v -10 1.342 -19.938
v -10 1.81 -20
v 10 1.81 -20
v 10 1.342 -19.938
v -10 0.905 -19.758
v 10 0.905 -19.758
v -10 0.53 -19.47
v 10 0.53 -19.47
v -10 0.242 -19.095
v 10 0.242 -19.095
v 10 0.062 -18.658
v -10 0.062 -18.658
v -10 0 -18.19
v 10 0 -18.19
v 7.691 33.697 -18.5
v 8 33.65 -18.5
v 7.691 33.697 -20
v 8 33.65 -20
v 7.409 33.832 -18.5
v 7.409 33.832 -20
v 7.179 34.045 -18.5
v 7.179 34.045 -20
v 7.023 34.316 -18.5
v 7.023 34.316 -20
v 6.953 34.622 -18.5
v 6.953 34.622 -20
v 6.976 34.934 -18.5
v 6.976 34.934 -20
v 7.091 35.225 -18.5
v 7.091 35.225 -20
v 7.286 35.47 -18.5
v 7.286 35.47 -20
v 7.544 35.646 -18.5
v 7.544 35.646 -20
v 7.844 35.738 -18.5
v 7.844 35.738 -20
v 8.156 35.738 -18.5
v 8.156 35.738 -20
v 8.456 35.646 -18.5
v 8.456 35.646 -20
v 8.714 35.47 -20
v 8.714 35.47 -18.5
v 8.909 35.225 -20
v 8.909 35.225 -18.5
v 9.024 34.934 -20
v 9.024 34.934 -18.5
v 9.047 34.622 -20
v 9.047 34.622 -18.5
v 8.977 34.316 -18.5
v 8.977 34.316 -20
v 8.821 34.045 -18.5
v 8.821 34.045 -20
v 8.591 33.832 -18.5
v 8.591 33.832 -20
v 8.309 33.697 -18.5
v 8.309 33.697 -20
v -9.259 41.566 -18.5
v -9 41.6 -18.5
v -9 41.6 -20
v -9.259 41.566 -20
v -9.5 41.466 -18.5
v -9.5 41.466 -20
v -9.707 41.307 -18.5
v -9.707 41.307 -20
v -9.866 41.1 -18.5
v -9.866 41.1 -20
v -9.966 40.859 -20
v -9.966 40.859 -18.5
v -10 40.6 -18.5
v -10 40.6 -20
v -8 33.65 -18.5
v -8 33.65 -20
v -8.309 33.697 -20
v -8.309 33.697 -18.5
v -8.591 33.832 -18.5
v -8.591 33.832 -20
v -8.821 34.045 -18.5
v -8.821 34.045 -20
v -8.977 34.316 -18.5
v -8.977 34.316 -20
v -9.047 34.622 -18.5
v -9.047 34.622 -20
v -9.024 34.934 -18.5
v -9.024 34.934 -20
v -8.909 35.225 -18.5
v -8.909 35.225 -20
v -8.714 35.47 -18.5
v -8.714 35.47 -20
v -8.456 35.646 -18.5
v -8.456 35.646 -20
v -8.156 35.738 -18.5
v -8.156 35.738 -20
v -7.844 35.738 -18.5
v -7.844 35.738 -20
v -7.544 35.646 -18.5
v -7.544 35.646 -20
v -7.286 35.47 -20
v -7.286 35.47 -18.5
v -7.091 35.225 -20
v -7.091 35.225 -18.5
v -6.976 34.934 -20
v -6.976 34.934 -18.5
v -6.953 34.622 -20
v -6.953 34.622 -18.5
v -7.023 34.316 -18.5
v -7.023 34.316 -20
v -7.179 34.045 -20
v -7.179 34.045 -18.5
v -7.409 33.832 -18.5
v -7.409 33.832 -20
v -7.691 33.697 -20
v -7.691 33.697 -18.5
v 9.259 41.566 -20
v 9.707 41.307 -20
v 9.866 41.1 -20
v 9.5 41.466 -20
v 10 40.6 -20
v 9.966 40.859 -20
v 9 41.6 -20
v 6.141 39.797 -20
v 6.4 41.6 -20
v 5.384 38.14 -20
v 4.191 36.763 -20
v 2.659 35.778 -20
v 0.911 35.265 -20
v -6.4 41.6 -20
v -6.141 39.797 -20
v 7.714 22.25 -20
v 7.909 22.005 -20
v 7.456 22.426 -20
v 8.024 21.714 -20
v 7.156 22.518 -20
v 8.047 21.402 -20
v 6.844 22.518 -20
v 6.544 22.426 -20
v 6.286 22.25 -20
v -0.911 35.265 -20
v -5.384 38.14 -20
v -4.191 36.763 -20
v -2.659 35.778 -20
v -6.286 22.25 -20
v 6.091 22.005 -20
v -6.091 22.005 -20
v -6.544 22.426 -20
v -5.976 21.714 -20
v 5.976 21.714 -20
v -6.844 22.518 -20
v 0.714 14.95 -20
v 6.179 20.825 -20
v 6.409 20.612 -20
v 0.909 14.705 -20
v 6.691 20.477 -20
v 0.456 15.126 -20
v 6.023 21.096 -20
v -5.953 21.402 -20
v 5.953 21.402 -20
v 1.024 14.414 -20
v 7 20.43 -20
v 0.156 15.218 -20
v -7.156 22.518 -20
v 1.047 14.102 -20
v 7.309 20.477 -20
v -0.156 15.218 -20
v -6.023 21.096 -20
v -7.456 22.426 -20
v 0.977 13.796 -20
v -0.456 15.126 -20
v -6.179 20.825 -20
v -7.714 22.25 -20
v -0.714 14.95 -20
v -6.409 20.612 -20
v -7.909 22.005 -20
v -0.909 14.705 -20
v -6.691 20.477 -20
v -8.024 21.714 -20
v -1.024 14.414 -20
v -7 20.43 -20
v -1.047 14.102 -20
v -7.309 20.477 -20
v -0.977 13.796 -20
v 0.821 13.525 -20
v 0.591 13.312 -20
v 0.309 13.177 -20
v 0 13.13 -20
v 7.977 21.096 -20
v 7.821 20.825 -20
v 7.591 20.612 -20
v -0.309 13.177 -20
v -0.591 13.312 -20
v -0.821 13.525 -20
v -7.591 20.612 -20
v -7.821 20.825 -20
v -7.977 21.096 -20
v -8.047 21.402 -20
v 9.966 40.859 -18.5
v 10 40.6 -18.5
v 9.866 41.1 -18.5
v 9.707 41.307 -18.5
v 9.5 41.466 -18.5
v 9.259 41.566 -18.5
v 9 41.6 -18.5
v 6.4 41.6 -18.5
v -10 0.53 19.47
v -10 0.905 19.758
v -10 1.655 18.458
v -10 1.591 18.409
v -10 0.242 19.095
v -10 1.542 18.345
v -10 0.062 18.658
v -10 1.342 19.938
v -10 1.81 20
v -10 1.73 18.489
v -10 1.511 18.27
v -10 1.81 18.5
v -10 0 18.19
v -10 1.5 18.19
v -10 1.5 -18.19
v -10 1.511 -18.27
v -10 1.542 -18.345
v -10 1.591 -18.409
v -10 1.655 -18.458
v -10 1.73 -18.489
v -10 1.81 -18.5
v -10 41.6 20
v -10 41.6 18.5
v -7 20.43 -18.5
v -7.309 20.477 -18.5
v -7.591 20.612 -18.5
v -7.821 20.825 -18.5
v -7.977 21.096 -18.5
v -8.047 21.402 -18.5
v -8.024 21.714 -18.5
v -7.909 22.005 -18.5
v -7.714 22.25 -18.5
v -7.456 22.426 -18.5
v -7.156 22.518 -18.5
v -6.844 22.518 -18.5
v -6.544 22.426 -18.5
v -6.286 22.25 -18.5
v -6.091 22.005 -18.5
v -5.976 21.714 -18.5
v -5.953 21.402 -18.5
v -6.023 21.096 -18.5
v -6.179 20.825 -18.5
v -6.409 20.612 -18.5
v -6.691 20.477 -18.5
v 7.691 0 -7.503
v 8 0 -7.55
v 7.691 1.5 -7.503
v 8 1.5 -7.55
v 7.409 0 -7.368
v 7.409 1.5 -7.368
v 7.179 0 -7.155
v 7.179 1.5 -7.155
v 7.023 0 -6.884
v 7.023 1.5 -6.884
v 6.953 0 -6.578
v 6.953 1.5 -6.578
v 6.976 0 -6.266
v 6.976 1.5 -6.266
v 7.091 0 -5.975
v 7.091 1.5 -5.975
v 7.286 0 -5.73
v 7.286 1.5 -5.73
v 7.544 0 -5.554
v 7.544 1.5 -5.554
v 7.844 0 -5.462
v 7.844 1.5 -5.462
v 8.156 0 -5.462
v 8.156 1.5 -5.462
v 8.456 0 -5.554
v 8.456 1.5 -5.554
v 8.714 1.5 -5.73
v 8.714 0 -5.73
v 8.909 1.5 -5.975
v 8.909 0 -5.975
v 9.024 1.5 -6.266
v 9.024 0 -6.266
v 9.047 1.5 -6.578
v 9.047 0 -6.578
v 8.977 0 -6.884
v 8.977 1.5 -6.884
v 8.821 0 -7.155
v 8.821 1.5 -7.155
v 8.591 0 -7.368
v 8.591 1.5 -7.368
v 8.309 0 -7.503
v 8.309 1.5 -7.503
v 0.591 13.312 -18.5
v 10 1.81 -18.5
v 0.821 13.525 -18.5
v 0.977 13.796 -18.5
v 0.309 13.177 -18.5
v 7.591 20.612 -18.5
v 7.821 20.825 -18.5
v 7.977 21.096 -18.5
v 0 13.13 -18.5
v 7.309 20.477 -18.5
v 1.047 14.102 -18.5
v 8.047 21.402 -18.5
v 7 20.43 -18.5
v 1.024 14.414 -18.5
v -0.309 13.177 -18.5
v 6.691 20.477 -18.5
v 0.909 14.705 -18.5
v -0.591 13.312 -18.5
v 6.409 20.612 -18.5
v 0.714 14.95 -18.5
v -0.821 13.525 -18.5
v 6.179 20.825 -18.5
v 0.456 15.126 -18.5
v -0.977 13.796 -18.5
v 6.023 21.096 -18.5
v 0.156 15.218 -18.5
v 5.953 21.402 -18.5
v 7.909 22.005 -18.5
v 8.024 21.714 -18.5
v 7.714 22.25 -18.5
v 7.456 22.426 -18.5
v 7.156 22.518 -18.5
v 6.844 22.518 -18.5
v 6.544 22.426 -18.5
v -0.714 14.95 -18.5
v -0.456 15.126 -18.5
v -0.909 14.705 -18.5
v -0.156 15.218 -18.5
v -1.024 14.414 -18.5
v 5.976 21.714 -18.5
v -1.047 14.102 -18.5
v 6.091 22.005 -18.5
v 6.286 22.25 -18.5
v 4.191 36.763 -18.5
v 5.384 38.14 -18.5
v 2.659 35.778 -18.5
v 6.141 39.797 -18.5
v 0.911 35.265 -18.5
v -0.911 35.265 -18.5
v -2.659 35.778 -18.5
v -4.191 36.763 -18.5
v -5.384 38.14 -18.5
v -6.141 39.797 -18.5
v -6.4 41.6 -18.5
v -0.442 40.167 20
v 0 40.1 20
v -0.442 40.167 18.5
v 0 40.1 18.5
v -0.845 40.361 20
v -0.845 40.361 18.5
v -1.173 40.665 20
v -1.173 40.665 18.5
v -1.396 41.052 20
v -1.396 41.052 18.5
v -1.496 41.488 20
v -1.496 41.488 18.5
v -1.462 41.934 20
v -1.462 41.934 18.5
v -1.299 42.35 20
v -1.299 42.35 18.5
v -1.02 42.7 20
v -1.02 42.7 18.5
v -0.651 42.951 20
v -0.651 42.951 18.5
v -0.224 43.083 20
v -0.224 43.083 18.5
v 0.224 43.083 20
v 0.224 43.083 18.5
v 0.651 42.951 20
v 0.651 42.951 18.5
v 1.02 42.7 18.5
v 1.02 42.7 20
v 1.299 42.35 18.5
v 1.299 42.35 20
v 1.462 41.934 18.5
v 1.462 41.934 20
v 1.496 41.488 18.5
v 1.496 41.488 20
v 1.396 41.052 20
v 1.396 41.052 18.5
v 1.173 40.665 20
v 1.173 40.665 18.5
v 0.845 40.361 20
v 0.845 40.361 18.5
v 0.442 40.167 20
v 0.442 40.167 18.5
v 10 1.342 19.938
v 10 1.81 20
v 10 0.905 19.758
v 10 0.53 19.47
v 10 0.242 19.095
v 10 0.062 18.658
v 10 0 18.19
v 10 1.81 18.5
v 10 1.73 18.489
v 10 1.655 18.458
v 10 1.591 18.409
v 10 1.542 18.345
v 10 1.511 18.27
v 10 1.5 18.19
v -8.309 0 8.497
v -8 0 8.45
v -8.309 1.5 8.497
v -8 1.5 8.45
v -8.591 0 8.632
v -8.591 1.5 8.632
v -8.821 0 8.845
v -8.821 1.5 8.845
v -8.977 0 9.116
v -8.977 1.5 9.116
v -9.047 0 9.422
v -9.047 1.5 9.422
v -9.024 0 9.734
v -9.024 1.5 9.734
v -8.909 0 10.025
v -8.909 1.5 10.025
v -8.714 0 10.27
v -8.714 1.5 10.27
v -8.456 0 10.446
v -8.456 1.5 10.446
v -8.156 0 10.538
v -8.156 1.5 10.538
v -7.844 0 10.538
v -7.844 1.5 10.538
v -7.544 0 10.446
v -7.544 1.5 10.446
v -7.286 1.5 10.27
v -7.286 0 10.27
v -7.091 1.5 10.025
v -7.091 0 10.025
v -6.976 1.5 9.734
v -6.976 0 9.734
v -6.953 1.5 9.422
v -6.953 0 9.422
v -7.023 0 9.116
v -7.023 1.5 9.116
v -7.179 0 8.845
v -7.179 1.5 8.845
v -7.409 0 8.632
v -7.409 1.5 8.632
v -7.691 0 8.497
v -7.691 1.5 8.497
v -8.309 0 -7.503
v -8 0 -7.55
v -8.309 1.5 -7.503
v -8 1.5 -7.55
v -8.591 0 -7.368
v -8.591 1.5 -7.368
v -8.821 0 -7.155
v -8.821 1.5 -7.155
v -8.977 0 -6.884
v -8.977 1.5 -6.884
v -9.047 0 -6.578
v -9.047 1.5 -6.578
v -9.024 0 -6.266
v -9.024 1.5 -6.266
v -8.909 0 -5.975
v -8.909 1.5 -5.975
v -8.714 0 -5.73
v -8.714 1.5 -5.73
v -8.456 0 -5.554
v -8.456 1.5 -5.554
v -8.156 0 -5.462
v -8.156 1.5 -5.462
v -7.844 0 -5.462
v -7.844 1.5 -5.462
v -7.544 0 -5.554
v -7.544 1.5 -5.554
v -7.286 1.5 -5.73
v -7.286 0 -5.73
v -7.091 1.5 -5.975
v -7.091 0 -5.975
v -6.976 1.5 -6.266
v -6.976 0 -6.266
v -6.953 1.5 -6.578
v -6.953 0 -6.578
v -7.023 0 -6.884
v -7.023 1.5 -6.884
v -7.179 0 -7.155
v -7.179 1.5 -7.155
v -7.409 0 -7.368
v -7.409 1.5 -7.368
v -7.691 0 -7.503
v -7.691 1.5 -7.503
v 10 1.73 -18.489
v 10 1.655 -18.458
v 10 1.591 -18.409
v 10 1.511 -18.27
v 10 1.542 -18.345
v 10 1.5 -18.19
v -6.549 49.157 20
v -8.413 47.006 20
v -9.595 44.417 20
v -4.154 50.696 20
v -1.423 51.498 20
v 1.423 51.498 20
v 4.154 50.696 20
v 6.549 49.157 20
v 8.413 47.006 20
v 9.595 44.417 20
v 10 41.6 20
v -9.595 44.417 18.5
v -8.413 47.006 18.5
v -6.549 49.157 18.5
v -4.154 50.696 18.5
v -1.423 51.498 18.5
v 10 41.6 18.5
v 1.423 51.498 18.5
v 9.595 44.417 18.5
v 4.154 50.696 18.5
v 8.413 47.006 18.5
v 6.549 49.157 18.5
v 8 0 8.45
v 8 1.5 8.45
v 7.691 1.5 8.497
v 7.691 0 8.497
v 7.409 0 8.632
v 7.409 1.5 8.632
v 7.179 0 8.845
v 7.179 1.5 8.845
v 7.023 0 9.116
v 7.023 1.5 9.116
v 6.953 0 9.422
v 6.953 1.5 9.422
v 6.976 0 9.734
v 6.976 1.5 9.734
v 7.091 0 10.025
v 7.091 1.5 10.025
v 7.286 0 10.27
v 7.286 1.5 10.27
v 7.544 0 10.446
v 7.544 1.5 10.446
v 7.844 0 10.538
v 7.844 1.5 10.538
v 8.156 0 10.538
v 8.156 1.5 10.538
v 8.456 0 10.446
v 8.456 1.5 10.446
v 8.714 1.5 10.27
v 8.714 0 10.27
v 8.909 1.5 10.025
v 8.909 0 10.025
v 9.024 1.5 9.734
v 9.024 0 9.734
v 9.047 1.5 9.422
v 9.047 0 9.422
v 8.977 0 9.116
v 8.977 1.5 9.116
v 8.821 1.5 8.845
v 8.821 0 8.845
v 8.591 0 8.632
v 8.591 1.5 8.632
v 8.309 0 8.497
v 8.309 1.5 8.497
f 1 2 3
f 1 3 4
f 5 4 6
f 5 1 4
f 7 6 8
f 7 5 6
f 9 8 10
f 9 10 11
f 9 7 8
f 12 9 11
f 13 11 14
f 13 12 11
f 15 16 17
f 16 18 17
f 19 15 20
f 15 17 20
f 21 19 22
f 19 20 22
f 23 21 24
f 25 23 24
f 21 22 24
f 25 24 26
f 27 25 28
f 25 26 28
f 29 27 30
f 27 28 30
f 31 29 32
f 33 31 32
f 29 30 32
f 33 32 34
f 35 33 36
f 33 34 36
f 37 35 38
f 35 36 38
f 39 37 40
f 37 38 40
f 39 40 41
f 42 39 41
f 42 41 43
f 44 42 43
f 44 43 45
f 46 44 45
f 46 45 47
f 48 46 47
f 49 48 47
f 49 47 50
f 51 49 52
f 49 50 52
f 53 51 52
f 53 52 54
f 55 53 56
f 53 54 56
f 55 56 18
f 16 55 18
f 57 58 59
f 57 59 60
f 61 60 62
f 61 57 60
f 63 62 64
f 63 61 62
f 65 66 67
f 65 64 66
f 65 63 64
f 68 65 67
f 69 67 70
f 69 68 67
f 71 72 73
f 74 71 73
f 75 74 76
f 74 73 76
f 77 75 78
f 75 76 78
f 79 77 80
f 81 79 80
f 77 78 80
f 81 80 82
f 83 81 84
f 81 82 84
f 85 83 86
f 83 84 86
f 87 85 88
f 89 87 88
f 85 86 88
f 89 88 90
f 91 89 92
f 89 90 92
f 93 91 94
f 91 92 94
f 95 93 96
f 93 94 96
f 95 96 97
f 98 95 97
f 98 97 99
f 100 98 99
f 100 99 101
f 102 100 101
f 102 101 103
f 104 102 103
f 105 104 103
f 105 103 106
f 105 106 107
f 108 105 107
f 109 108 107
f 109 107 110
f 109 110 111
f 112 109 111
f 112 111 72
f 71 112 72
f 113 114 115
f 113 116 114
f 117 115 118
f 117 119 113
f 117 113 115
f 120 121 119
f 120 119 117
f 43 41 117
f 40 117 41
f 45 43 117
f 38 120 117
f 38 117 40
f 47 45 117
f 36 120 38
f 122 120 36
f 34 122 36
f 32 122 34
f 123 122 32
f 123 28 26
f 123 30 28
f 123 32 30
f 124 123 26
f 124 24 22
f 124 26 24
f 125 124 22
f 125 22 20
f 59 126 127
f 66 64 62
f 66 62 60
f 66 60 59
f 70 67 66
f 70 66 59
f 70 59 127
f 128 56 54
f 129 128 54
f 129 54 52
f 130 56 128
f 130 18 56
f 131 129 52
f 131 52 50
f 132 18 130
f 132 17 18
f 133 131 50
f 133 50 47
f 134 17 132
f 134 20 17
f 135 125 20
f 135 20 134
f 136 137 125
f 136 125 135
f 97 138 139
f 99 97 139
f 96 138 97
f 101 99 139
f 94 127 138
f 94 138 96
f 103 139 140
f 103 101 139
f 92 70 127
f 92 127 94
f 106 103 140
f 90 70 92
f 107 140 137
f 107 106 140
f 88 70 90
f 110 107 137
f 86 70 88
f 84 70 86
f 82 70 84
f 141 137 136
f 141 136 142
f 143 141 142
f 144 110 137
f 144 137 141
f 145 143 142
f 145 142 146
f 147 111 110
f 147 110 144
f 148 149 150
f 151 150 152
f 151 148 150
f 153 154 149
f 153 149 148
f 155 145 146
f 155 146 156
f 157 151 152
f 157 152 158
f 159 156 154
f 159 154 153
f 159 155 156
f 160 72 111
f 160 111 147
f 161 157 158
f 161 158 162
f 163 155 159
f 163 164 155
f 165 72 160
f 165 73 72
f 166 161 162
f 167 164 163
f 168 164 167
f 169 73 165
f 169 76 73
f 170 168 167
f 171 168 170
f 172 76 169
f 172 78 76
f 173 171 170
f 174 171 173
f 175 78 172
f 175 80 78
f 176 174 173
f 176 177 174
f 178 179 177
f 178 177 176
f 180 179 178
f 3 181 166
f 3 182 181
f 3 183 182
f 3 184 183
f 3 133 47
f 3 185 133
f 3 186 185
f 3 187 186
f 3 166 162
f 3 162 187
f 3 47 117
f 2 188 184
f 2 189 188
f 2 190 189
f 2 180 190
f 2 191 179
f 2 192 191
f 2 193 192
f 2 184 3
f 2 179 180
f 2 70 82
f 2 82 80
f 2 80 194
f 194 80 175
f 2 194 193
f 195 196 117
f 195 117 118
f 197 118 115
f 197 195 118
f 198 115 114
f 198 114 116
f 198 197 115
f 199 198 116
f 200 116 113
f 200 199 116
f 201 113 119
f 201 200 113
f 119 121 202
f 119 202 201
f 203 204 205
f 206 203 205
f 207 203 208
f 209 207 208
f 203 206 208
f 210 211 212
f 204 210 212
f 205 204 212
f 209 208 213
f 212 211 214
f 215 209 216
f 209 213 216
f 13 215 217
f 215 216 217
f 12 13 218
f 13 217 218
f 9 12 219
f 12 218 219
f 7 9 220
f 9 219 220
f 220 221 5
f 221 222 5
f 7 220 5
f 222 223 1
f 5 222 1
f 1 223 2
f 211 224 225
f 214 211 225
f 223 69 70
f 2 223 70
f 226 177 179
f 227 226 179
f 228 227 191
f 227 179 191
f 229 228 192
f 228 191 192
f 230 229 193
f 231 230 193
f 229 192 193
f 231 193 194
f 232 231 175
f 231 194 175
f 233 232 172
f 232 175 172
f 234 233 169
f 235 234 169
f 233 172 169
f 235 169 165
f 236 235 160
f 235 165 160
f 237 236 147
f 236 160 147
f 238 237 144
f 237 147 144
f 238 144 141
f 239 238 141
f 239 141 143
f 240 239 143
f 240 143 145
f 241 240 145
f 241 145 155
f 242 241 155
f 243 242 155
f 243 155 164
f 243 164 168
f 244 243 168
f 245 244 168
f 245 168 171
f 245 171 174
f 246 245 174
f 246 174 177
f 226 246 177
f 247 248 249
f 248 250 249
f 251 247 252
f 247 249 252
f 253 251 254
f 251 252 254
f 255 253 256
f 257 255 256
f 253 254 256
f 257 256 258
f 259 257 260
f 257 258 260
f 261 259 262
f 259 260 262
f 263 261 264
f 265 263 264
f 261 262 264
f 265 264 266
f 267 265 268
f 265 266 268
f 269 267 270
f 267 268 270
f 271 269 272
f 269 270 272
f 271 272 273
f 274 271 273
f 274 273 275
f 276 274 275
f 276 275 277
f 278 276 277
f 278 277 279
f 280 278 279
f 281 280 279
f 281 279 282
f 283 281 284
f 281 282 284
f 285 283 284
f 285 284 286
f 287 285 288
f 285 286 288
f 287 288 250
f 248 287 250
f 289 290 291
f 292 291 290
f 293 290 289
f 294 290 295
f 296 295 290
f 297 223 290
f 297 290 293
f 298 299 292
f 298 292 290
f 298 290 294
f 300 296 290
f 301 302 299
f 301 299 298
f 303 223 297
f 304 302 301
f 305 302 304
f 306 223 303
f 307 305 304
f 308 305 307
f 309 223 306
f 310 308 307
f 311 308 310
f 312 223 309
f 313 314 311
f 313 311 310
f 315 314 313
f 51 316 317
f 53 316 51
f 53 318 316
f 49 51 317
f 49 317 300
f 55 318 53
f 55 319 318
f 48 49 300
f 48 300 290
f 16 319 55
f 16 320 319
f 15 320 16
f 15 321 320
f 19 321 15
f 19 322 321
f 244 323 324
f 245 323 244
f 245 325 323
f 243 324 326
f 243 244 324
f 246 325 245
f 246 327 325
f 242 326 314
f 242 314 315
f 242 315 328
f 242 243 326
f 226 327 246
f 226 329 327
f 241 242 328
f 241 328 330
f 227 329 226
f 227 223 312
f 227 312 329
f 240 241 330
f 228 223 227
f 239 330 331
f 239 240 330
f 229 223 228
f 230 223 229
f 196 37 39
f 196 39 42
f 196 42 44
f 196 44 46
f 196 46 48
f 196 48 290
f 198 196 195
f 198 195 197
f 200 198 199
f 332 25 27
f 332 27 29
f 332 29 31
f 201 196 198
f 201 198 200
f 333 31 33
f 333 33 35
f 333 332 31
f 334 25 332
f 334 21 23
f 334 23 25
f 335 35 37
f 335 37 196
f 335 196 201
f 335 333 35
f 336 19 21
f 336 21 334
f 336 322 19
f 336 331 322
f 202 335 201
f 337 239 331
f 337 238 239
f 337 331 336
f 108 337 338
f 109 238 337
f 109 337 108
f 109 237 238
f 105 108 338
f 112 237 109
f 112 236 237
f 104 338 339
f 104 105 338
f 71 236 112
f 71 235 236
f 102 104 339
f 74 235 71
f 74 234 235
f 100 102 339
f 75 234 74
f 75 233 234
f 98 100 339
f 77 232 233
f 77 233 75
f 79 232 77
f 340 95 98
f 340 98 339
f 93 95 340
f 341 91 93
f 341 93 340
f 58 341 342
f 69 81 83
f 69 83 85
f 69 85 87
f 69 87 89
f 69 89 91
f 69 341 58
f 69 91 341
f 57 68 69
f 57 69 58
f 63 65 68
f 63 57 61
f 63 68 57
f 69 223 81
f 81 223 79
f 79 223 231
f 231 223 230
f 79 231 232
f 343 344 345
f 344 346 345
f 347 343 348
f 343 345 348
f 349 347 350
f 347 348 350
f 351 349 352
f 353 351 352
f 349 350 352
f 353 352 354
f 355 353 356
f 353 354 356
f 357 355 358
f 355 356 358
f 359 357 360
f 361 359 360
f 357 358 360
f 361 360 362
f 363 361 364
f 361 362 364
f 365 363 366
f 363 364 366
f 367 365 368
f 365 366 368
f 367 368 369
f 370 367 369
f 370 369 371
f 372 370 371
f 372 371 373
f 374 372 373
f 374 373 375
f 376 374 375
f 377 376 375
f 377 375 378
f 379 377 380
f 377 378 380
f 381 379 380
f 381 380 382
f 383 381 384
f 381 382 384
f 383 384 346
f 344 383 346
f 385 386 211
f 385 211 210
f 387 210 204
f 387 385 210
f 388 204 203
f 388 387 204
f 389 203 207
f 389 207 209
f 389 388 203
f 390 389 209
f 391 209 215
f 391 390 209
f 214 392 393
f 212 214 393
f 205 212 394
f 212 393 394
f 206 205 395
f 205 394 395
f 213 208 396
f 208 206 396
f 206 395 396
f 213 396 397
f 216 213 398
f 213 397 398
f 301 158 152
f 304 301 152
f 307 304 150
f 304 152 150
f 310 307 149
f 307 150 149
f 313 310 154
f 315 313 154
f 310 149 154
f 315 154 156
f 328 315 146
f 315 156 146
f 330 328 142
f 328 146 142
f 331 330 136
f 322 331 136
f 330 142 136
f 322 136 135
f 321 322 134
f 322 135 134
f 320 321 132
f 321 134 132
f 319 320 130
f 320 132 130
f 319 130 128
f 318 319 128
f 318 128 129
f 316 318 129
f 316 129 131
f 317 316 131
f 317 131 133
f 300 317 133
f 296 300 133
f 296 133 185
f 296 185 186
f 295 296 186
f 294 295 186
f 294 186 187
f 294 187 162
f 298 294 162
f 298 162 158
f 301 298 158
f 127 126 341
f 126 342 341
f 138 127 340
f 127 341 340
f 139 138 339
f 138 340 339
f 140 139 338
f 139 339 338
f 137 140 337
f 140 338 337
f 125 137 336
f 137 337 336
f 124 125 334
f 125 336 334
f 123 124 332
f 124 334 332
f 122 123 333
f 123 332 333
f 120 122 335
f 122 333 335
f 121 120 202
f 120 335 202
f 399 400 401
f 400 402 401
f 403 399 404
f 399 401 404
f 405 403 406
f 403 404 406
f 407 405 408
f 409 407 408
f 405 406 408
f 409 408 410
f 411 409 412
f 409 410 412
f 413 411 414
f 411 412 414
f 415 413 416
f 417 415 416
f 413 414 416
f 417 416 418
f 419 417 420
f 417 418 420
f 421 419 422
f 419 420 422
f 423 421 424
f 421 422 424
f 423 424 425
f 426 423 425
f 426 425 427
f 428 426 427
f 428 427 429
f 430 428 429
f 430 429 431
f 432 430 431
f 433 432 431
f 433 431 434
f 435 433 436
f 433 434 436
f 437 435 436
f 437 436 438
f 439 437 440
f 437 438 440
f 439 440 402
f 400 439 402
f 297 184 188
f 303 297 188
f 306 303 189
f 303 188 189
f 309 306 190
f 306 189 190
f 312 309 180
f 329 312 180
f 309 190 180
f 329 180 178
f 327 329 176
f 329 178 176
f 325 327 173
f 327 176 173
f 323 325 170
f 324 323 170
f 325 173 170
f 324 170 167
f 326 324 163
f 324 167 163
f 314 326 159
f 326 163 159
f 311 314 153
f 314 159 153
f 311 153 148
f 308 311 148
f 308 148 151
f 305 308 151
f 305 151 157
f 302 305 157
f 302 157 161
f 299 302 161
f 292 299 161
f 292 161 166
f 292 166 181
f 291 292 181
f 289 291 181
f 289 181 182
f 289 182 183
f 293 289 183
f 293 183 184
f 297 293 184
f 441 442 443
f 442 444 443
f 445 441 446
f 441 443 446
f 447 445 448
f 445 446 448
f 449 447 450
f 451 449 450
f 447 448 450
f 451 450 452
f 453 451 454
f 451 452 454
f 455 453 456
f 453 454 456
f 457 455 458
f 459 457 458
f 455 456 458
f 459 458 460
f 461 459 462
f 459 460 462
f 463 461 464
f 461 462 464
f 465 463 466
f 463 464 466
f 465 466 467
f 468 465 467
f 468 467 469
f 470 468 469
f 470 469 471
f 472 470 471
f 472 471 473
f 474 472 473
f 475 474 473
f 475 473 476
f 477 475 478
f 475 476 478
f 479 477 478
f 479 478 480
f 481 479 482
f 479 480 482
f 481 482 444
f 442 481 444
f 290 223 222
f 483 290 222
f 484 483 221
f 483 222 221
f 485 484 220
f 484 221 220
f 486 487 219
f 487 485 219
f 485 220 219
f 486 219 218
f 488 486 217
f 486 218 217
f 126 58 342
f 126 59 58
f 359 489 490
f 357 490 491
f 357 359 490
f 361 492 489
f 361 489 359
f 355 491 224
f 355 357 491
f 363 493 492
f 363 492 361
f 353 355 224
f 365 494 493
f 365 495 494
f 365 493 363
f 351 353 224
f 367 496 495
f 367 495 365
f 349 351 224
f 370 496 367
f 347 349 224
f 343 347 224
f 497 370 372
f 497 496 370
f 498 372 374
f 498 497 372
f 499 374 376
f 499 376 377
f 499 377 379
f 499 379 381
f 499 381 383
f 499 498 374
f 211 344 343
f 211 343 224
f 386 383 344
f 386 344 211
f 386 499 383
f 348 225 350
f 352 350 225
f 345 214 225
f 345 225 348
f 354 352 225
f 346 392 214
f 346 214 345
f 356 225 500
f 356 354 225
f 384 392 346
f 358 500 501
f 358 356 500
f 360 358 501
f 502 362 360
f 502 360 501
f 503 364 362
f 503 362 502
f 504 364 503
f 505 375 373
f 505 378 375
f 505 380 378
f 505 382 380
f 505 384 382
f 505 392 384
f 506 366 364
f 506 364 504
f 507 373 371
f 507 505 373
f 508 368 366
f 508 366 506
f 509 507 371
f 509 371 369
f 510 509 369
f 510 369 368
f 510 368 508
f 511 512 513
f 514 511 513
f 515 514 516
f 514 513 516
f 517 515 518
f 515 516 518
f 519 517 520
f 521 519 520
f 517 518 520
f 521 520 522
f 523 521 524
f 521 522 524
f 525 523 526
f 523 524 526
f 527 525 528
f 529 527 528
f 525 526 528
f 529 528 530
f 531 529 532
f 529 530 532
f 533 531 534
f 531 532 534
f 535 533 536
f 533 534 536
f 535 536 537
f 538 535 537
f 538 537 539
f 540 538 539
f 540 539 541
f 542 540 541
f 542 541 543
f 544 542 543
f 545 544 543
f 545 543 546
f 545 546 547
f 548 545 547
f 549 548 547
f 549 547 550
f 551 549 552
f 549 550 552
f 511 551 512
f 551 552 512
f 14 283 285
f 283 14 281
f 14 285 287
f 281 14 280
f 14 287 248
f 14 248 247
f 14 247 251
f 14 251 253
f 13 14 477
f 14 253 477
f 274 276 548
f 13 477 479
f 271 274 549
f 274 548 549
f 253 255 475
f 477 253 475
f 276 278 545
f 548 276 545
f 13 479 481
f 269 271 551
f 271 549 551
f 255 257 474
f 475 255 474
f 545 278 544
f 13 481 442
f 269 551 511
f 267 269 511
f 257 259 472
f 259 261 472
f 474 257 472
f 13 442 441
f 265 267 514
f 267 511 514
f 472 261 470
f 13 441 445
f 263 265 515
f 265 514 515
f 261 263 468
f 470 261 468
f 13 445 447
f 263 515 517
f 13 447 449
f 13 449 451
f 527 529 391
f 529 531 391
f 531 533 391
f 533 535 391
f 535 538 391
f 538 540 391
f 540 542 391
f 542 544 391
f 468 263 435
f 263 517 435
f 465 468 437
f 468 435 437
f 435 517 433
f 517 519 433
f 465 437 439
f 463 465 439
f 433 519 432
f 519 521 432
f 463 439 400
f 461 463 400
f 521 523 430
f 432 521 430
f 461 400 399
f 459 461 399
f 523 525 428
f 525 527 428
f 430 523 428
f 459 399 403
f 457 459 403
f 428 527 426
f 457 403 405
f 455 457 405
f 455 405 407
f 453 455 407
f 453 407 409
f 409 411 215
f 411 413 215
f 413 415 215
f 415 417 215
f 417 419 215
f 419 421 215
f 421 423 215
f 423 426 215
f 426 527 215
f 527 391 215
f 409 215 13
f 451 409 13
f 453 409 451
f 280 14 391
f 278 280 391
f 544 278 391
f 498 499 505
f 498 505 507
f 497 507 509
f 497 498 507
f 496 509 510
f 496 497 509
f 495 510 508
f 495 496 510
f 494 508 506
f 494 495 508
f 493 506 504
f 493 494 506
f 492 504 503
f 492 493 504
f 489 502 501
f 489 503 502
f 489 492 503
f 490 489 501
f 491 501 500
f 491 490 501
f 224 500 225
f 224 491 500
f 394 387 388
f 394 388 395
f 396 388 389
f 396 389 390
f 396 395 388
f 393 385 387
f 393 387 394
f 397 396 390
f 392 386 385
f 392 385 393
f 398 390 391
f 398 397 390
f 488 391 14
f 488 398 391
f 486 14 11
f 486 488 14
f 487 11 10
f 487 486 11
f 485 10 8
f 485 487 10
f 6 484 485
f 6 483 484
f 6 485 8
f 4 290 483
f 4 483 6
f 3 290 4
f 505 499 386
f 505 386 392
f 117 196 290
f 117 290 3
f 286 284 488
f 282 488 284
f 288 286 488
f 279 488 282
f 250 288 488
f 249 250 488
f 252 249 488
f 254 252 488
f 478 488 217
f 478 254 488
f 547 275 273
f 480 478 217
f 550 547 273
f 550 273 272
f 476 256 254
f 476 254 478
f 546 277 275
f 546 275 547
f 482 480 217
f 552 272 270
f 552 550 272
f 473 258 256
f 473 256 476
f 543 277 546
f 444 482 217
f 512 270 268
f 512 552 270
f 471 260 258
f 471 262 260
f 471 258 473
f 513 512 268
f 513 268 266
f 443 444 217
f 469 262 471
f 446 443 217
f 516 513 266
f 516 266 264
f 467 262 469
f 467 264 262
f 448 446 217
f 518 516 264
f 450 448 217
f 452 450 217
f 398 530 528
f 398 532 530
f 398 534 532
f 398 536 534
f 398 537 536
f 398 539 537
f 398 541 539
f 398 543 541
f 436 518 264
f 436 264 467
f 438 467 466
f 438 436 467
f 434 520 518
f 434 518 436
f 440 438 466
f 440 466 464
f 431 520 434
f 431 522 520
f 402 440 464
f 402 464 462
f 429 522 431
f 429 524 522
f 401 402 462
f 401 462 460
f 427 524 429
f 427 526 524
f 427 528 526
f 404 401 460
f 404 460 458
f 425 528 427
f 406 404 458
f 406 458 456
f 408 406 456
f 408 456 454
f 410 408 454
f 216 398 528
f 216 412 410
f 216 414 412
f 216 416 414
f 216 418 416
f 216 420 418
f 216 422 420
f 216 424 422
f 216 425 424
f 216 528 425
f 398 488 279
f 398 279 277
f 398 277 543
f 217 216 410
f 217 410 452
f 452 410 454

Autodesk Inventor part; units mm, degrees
ref_plane "YZ Plane" through (0, 0, 0) normal (1, 0, 0) x (0, 1, 0)
ref_plane "XZ Plane" through (0, 0, 0) normal (0, 1, 0) x (-1, 0, 0)
ref_plane "XY Plane" through (0, 0, 0) normal (0, 0, 1) x (1, 0, 0)
sketch "Sketch1" plane through (0, 0, 0) normal (0, 1, 0) x (-1, 0, 0)
  line L0 (10, -18.5) -> (-10, -18.5)
  line L1 (-10, -18.5) -> (-10, 18.5)
  line L2 (-10, 18.5) -> (10, 18.5)
  line L3 (10, 18.5) -> (10, -18.5)
  point P0 (0, 0)
  dimension "d0" = 20
  dimension "d1" = 37
  dimension "d2" = 18.5
  dimension "d3" = 10
extrude "Plate1" add sketch "Sketch1" along normal blind 1.5
sketch "Sketch2" plane through (-10, 0, -20) normal (0, 0, 1) x (1, 0, 0)
  line L0 (20, 0) -> (0, 0)
  line L1 (0, 0) -> (0, 51.6)
  line L2 (0, 51.6) -> (20, 51.6)
  line L3 (20, 51.6) -> (20, 0)
edge flange "Flange1" height 51.6 angle 90 thickness 1.5 bend radius 0.31 thickness toward (0, 0, 1) relief tear relief width 1.5 relief depth 0.75 edges at (0, 1.5, -18.5) wall of the first edge with corners at (10, 0, -20) (-10, 0, -20) (-10, 51.6, -20) (10, 51.6, -20)
bend "Bend1"
corner "Corner1"
sketch "Sketch3" plane through (10, 0, 20) normal (0, 0, -1) x (-1, 0, 0)
  line L0 (20, 0) -> (0, 0)
  line L1 (0, 0) -> (0, 51.6)
  line L2 (0, 51.6) -> (20, 51.6)
  line L3 (20, 51.6) -> (20, 0)
edge flange "Flange2" height 51.6 angle 90 thickness 1.5 bend radius 0.31 thickness toward (0, 0, -1) relief tear relief width 1.5 relief depth 0.75 edges at (0, 1.5, 18.5) wall of the first edge with corners at (-10, 0, 20) (10, 0, 20) (10, 51.6, 20) (-10, 51.6, 20)
bend "Bend2"
corner "Corner2"
sketch "Sketch4" plane through (-10, 51.6, 20) normal (0, 0, 1) x (1, 0, 0)
  circle A0 centre (10, -10) radius 10
  line L0 (0, 0) -> (20, 0) projected
  line L1 (0, 0) -> (20, 0)
  line L2 (20, 0) -> (20, -10)
  line L3 (20, -10) -> (0, -10)
  line L4 (0, -10) -> (0, 0)
  line L5 (0, -49.79) -> (0, 0) projected
  point P0 (10, -51.6)
  point P1 (10, 0)
  dimension "d26" = 20
  dimension "d25" = 10
  dimension "d27" = 10
  dimension "d28" = 10
extrude "Extrusion1" cut sketch "Sketch4" against normal blind 10 contours L4 L0 A0 | A0 L0 L2
sketch "Sketch5" plane through (10, 51.6, -20) normal (0, 0, -1) x (-1, 0, 0)
  arc A0 (20, -10) -> (0, -10) centre (10, -10) ccw projected
  point P0 (10, -51.6)
hole "Hole1" at (0, 41.6, -20) direction (0, 0, 1) diameter 12.8 depth 1.5
sketch "Sketch6" plane through (10, 51.6, -20) normal (0, 0, -1) x (-1, 0, 0)
  line L0 (0, 0) -> (20, 0) projected
  circle A0 centre (10, -10) radius 6.4 projected
  line L1 (-4, 0) -> (24, 0)
  line L2 (24, 0) -> (24, -10)
  line L3 (24, -10) -> (-4, -10)
  line L4 (-4, -10) -> (-4, 0)
  line L5 (0, -49.79) -> (0, 0) projected
  line L6 (0, -49.79) -> (20, -49.79) projected
  point P0 (10, -51.6)
  dimension "d38" = 28
  dimension "d39" = 10
  dimension "d40" = 4
  dimension "d41" = 49.79
extrude "Extrusion2" cut sketch "Sketch6" against normal blind 10 contours L5 L3 L4 L1 | L0 L1 L2 L3 A0 L5 | A0 L3 picked at (9.2435, -8.0053)
sketch "Sketch7" plane through (-10, 1.81, -18.5) normal (0, 0, 1) x (1, 0, 0)
  circle A0 centre (10, 12.37) radius 0.7835 projected
  circle A1 centre (17, 19.67) radius 0.7835 projected
  line L0 (16.4, 39.79) -> (20, 39.79) projected
  line L1 (20, 0) -> (20, 39.79) projected
  line L2 (20, 0) -> (0, 0) projected
  line L3 (0, 39.79) -> (0, 0) projected
  line L4 (0, 39.79) -> (3.6, 39.79) projected
  arc A2 (3.6, 39.79) -> (16.4, 39.79) centre (10, 39.79) ccw projected
  circle A3 centre (3, 19.67) radius 0.7835 projected
  circle A4 centre (2, 32.89) radius 0.7835 projected
  circle A5 centre (18, 32.89) radius 0.7835 projected
  point P0 (10, -1.81)
hole "Hole2" at (0, 14.18, -18.5) at (-7, 21.48, -18.5) at (-8, 34.7, -18.5) at (8, 34.7, -18.5) at (7, 21.48, -18.5) direction (0, 0, -1) diameter 2.1 depth 1.5
fillet "Fillet1" radius 1 2 edges at (-10, 41.6, -19.25) (10, 41.6, -19.25)
sketch "Sketch8" plane through (-10, 1.81, 20) normal (0, 0, 1) x (1, 0, 0)
  arc A0 (20, 39.79) -> (0, 39.79) centre (10, 39.79) ccw projected
  point P0 (10, -1.81)
hole "Hole3" at (0, 41.6, 20) direction (0, 0, -1) diameter 3 depth 1.5
sketch "Sketch9" plane through (0, 0, 0) normal (0, -1, 0) x (1, 0, 0)
  line L0 (10.07, -24.6) -> (10.07, 7.5) projected
  line L1 (10, 20) -> (-10, 20) projected
  line L2 (10, 18.19) -> (10, -18.19) projected
  point P0 (0, 0)
  point P1 (8, 9.5)
  point P2 (8, -6.5)
  point P3 (-8, 9.5)
  point P4 (-8, -6.5)
  dimension "d59" = 2
  dimension "d60" = 10.5
  dimension "d63" = 16
  dimension "d66" = 16
hole "Hole4" at (8, 0, 9.5) at (8, 0, -6.5) at (-8, 0, 9.5) at (-8, 0, -6.5) direction (0, 1, 0) diameter 2.1 depth 1.5
equation "\"d36\" = Thickness"
equation "\"d49\" = Thickness"
equation "\"d57\" = Thickness"
equation "\"d74\" = Thickness"
equation "\"d4\" = Thickness"
equation "\"d5\" = BendReliefWidth"
equation "\"d6\" = BendReliefDepth"
equation "\"d7\" = MinimumRemnant"
equation "\"d8\" = TransitionRadius"
equation "\"d11\" = BendRadius"
equation "\"d12\" = CornerReliefSize"
equation "\"d13\" = GapSize"
equation "\"d14\" = JacobiRadiusSize"
equation "\"d15\" = BendReliefWidth"
equation "\"d16\" = BendReliefDepth"
equation "\"d17\" = MinimumRemnant"
equation "\"d18\" = TransitionRadius"
equation "\"d21\" = BendRadius"
equation "\"d22\" = CornerReliefSize"
equation "\"d23\" = GapSize"
equation "\"d24\" = JacobiRadiusSize"
equation "\"BendReliefWidth\" = Thickness"
equation "\"BendReliefDepth\" = 0.5 * Thickness"
equation "\"CornerReliefSize\" = 4 * Thickness"
equation "\"MinimumRemnant\" = 2 * Thickness"
equation "\"TransitionRadius\" = BendRadius"
equation "\"JacobiRadiusSize\" = BendRadius"
equation "\"GapSize\" = Thickness"
equation "\"Thickness\" = 1.5"
equation "\"BendRadius\" = 0.31"
properties part number "axis_9_bottom_frame" material "Aluminum 6061-AHC"
